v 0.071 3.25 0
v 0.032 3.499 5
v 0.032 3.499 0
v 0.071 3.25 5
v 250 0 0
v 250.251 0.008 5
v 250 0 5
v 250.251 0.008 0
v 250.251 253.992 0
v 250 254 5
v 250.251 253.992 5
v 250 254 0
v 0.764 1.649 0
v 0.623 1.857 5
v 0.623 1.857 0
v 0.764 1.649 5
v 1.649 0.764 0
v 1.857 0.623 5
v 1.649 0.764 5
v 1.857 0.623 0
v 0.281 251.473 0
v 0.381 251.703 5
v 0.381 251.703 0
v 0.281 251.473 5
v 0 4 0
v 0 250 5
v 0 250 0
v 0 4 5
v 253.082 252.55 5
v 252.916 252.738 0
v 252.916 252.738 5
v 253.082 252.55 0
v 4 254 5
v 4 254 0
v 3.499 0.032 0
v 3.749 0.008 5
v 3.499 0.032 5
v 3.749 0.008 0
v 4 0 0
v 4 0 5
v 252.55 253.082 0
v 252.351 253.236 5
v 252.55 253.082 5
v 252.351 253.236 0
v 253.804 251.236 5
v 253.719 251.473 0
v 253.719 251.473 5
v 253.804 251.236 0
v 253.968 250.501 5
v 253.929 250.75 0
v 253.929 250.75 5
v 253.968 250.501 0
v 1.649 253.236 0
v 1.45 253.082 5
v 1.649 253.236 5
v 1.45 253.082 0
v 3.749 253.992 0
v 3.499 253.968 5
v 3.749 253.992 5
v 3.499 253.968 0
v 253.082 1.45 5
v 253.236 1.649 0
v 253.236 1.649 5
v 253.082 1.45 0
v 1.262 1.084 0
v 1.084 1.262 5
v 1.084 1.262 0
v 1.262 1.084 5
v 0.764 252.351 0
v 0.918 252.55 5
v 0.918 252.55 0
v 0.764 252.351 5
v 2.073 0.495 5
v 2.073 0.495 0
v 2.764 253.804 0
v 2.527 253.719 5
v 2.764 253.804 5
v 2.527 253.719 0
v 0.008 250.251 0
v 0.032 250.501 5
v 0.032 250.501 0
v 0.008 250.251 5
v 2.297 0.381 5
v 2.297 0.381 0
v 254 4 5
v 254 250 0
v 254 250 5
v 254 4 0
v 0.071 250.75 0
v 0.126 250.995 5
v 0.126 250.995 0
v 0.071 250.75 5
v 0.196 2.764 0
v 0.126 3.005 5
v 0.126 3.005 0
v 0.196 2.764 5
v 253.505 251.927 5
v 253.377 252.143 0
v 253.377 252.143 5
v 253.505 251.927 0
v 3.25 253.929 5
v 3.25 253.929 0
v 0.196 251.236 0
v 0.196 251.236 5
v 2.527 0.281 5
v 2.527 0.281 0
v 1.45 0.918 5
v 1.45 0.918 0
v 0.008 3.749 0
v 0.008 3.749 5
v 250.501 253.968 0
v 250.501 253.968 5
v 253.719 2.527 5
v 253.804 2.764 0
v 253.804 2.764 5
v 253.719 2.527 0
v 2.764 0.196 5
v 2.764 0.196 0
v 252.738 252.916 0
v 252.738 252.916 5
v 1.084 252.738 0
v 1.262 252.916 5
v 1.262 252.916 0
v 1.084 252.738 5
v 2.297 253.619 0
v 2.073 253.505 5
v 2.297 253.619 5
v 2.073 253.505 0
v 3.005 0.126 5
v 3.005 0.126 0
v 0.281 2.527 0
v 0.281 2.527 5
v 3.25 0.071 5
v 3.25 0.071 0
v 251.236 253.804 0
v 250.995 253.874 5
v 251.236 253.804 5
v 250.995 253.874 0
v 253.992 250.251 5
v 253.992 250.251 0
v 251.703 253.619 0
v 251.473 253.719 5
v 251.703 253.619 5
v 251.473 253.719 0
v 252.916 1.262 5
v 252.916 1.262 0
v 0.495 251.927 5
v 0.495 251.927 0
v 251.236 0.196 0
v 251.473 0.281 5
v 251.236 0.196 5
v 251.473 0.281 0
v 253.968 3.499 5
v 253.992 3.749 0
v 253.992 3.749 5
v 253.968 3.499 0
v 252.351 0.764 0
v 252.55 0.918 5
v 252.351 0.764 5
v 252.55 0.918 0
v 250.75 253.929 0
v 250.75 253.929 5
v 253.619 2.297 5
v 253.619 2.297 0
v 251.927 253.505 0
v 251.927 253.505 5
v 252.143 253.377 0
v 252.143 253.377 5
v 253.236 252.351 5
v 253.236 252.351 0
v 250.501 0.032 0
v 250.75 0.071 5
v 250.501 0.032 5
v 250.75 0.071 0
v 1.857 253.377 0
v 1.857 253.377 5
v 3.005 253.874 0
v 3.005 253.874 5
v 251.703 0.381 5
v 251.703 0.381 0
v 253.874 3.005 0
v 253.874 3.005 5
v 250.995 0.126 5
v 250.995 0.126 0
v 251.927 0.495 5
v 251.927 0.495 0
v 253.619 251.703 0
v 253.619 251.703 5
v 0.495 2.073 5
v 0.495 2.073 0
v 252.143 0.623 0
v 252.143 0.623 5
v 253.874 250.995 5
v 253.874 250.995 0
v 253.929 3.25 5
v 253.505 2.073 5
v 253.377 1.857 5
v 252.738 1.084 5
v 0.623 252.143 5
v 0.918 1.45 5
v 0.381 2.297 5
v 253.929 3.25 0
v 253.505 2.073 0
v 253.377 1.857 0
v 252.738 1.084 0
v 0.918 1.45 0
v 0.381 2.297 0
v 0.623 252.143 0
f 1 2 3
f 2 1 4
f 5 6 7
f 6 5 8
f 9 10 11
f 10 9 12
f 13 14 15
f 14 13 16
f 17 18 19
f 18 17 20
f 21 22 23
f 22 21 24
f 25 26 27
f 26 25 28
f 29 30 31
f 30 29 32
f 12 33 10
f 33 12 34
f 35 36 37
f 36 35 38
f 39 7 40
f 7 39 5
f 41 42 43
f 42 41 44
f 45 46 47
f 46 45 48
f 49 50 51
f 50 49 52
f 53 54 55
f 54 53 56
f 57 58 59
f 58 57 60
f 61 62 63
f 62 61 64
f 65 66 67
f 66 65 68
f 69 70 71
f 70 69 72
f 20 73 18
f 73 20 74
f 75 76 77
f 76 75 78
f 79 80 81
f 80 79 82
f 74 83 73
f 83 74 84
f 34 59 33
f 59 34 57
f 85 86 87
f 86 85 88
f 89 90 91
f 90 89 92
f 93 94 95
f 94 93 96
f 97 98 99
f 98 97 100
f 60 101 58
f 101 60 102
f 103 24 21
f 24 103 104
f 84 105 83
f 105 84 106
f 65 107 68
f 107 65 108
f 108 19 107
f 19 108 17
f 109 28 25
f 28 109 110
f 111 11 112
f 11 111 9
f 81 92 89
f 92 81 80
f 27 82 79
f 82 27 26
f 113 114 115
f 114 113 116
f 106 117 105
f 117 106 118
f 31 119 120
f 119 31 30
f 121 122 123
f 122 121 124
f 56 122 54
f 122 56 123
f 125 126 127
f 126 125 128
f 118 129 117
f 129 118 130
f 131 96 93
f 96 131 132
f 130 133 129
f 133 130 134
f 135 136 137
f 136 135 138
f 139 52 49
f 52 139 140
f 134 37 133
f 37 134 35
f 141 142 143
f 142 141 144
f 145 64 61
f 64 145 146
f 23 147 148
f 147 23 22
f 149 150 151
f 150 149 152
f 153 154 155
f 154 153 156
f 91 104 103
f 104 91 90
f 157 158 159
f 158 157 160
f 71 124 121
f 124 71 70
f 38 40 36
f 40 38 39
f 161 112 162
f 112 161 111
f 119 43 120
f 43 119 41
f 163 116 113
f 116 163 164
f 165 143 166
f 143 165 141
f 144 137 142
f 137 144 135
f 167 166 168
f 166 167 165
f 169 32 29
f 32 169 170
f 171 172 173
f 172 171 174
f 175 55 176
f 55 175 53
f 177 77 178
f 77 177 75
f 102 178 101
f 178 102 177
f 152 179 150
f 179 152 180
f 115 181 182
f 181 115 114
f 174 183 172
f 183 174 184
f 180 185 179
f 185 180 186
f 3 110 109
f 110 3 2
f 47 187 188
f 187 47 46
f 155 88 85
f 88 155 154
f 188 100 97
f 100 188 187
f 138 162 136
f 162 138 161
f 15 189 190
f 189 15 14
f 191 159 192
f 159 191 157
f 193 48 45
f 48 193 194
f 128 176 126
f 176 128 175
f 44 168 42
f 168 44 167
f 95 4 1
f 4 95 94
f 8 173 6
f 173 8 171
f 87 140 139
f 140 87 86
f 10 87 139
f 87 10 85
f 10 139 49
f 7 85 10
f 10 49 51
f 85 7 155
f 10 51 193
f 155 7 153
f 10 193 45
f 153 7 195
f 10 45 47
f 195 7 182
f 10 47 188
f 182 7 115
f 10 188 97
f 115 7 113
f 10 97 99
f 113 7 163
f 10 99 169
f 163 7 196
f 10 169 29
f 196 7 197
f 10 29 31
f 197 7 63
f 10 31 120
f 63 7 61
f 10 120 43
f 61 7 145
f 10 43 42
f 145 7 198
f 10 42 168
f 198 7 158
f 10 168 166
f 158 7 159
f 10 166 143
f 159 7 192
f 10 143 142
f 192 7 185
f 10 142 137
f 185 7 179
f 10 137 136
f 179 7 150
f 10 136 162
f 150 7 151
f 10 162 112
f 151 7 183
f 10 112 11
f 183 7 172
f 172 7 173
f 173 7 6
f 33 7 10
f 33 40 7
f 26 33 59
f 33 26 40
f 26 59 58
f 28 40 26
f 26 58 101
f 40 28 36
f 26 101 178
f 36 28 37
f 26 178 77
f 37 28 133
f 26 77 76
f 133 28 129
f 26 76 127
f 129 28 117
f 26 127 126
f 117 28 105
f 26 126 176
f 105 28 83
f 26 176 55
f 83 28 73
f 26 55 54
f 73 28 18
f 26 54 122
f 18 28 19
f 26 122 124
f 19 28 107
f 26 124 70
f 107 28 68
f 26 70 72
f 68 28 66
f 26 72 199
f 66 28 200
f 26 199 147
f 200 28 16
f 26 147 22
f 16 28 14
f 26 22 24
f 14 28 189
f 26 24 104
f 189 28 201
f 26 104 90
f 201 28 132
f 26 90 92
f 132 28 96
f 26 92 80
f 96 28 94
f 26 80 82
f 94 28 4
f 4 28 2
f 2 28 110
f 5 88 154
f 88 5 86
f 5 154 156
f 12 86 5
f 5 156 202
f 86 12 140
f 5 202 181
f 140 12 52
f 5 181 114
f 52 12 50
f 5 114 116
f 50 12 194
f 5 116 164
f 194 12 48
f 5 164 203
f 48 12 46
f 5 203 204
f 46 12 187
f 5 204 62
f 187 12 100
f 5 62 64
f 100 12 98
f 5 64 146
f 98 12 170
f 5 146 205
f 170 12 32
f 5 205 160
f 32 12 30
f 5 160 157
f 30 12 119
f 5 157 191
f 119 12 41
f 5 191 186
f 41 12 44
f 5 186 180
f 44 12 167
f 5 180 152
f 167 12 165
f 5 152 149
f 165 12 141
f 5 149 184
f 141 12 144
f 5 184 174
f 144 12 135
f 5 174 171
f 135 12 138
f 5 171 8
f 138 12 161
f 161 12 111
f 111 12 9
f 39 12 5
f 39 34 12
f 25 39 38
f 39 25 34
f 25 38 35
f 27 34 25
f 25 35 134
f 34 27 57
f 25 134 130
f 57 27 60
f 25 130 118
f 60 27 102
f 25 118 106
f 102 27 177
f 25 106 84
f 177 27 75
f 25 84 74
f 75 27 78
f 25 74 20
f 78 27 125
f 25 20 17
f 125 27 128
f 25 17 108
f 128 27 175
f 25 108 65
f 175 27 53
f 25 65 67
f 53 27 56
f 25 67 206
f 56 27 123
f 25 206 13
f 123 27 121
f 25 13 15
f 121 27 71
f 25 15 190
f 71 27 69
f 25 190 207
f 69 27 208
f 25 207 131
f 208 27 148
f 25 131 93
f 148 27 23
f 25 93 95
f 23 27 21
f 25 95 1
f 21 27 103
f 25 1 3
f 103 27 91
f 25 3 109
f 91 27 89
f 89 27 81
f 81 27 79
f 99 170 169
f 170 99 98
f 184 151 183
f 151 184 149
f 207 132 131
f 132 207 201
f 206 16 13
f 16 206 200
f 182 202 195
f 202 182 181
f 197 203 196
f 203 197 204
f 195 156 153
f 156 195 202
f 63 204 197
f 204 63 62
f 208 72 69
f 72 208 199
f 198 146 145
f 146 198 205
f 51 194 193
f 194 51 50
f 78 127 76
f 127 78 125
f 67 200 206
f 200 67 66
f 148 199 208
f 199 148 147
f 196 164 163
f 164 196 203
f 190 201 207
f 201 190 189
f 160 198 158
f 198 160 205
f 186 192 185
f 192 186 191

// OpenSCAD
// ============================================================
//  Topo Panel — Lawrence, KS
//  Debossed topographic contours and roads with optional
//  elevation relief on the panel surface.
//
//  Prerequisites:
//    Run `python topo_panel_generator.py` first to generate
//    the DXF/PNG files in ./topo_output/
//
//  Tip: Use F5 (preview) liberally — F6 (render) will be
//  slow due to the polygon count from buffered contour lines.
// ============================================================

$fn = 100;

// --- Panel dimensions ---
panel_size      = 254;     // mm (10 inches)
panel_thickness = 5;       // mm — base slab thickness
corner_radius   = 4;       // mm — 0 for sharp corners

// --- Deboss depths (from top surface, including relief) ---
contour_depth  = 1.0;     // mm — how deep the contour grooves cut
road_depth     = 1.4;     // mm — roads slightly deeper so they pop

// --- Elevation relief ---
//  Adds a 3D surface on top of the base panel.
//  Set to 0 to disable (flat panel with debossed grooves only).
relief_height  = 3.0;     // mm — height range added on top of base

// --- File paths (relative to this .scad file) ---
contour_file   = "topo_output/contours.dxf";
road_file      = "topo_output/roads.dxf";
heightmap_file = "topo_output/heightmap.png";

// ============================================================
//  Modules
// ============================================================

module rounded_square(size, radius) {
    if (radius > 0) {
        offset(r = radius)
        offset(delta = -radius)
            square(size);
    } else {
        square(size);
    }
}

module base_panel() {
    linear_extrude(height = panel_thickness)
        rounded_square(panel_size, corner_radius);
}

//  surface() reads the PNG as a height field.
//  Scale: pixel value 0→0mm, 255→relief_height mm.
//  The image covers panel_size x panel_size mm.
module relief_surface() {
    if (relief_height > 0) {
        translate([0, 0, 0])
        intersection() {
            // Clip relief to rounded panel outline
            linear_extrude(height = relief_height + 0.1)
                rounded_square(panel_size, corner_radius);

            scale([ceil(panel_size / 400), ceil(panel_size / 400), relief_height / 100])
                surface(file = heightmap_file, center = false, convexity = 5);
        }
    }
}

module contour_cut() {
    // Cut from the top of the highest possible point
    top = panel_thickness + relief_height;
    translate([0, 0, top - contour_depth])
        linear_extrude(height = contour_depth + 0.1)
            import(contour_file);
}

module road_cut() {
    top = panel_thickness + relief_height;
    translate([0, 0, top - road_depth])
        linear_extrude(height = road_depth + 0.1)
            import(road_file);
}

// ============================================================
//  Assembly
// ============================================================

difference() {
    union() {
        base_panel();
        relief_surface();
    }
    contour_cut();
    #road_cut();
}

// --- Optional: uncomment to see the border outline for alignment ---
// %translate([0, 0, panel_thickness + relief_height])
//     linear_extrude(height = 0.1)
//         import("topo_output/border.dxf");
